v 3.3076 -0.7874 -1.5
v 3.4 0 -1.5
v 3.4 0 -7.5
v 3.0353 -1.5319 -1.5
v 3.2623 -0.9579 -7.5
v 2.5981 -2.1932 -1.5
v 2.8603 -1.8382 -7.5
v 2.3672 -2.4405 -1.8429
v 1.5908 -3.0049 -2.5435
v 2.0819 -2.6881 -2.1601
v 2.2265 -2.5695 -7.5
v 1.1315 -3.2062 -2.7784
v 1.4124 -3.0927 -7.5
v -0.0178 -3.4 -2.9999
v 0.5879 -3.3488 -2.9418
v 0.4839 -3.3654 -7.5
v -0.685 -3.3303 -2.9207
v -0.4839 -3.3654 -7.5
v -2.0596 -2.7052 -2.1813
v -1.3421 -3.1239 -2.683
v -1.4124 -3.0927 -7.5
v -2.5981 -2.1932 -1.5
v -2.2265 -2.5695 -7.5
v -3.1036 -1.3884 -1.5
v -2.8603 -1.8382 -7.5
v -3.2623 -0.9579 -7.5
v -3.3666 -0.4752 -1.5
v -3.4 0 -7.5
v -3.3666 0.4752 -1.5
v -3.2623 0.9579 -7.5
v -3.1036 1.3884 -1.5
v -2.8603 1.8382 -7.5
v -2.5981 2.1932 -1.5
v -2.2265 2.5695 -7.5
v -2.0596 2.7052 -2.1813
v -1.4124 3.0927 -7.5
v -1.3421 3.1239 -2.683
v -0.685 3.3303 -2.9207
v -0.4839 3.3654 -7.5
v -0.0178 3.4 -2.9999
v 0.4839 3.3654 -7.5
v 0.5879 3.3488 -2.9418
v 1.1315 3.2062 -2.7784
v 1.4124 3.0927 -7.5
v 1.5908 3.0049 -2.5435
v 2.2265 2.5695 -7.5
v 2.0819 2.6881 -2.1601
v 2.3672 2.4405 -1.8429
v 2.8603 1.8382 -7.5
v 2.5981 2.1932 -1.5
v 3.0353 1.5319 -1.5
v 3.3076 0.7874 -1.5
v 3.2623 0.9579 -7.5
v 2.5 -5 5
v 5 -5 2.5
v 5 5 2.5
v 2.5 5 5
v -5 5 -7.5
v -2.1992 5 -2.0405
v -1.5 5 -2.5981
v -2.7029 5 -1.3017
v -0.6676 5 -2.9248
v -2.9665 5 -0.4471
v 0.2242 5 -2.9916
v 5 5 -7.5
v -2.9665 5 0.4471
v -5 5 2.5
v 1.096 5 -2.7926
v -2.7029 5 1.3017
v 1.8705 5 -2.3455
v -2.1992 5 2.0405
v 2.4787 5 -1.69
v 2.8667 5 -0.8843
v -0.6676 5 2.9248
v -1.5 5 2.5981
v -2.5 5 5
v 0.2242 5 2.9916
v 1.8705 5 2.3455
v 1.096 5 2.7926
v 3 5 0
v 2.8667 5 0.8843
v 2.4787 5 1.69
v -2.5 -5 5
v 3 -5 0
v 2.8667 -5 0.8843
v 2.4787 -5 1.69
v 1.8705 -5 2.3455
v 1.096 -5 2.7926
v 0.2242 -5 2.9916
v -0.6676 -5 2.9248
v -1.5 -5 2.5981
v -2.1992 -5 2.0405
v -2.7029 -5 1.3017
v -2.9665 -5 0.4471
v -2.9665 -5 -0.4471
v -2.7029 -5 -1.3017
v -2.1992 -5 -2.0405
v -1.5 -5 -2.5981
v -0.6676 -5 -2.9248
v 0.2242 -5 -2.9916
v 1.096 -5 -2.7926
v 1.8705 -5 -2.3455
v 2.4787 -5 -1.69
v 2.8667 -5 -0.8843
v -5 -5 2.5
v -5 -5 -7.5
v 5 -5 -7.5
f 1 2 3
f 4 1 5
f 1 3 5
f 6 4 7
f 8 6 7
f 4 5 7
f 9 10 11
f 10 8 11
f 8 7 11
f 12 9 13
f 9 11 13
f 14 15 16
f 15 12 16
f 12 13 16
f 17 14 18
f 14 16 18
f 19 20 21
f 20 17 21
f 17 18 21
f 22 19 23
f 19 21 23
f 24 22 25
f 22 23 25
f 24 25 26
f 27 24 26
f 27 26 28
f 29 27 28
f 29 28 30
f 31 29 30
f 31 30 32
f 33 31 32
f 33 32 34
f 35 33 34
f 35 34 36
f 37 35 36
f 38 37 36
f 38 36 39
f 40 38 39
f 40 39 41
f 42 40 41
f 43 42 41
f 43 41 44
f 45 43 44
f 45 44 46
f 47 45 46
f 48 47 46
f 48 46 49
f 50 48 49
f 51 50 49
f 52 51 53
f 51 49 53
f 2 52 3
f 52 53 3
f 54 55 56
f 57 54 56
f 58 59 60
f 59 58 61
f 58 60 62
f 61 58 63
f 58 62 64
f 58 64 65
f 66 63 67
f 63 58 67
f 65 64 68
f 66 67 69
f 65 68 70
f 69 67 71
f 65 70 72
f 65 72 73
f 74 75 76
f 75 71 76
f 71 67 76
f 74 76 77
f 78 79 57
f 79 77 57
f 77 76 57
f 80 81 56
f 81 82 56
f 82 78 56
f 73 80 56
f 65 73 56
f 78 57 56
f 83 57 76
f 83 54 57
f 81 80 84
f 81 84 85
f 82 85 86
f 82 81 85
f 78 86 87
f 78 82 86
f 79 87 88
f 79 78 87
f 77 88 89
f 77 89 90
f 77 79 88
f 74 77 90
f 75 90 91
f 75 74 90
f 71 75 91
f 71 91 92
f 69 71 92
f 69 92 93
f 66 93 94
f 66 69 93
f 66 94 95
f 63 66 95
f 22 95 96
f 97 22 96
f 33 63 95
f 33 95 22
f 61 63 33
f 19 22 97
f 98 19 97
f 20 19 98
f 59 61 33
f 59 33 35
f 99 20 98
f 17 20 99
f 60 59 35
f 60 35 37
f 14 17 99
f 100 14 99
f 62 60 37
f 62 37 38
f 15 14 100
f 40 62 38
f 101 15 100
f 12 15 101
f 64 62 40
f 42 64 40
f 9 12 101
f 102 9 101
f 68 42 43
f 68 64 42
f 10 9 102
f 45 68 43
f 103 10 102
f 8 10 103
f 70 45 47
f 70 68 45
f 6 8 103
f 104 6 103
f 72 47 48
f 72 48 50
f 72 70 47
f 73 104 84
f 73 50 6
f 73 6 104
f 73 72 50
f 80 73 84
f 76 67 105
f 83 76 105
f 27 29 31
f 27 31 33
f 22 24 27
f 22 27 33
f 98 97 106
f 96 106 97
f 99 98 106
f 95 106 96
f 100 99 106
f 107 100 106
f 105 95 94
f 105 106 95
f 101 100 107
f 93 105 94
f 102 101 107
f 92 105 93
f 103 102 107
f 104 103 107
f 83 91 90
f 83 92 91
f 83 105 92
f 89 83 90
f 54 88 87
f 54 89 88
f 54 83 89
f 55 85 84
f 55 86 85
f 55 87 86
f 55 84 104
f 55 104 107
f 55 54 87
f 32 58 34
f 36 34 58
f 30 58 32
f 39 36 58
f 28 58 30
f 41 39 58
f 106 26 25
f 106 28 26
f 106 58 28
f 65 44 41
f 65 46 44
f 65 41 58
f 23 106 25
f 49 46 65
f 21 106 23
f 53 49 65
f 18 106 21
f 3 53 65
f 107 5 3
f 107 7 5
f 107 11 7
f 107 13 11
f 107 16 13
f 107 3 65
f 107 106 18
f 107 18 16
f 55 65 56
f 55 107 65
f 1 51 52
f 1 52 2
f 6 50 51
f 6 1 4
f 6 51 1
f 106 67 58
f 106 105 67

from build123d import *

# Parameters (mm, degrees)
F0_R     = 3
F1_DEPTH = 5
F2_R     = 3.4
F3_DEPTH = 6
F4_SIZE  = 2.5


with BuildPart() as f1:
    # F0 (on Front) → F1 (new body, symmetric)
    with BuildSketch(Plane.XZ):
        Polygon((5, 5), (-5, 5), (-5, -5), (-5, -7.5), (5, -7.5), (5, -5), align=None)
        Circle(F0_R, mode=Mode.SUBTRACT)
    extrude(amount=F1_DEPTH, both=True)

    # F2 (on face) → F3 (cut)
    with BuildSketch(Plane(origin=(0, 0, -7.5), x_dir=(1, 0, 0), z_dir=(0, 0, -1))):
        Circle(F2_R)
    extrude(amount=-F3_DEPTH, mode=Mode.SUBTRACT)

    # F4
    f4_edges = [f1.edges().sort_by_distance(p)[0] for p in [
        (-5, 0, 5),
        (5, 0, 5),
    ]]
    chamfer(f4_edges, length=F4_SIZE)


solid = f1.part
